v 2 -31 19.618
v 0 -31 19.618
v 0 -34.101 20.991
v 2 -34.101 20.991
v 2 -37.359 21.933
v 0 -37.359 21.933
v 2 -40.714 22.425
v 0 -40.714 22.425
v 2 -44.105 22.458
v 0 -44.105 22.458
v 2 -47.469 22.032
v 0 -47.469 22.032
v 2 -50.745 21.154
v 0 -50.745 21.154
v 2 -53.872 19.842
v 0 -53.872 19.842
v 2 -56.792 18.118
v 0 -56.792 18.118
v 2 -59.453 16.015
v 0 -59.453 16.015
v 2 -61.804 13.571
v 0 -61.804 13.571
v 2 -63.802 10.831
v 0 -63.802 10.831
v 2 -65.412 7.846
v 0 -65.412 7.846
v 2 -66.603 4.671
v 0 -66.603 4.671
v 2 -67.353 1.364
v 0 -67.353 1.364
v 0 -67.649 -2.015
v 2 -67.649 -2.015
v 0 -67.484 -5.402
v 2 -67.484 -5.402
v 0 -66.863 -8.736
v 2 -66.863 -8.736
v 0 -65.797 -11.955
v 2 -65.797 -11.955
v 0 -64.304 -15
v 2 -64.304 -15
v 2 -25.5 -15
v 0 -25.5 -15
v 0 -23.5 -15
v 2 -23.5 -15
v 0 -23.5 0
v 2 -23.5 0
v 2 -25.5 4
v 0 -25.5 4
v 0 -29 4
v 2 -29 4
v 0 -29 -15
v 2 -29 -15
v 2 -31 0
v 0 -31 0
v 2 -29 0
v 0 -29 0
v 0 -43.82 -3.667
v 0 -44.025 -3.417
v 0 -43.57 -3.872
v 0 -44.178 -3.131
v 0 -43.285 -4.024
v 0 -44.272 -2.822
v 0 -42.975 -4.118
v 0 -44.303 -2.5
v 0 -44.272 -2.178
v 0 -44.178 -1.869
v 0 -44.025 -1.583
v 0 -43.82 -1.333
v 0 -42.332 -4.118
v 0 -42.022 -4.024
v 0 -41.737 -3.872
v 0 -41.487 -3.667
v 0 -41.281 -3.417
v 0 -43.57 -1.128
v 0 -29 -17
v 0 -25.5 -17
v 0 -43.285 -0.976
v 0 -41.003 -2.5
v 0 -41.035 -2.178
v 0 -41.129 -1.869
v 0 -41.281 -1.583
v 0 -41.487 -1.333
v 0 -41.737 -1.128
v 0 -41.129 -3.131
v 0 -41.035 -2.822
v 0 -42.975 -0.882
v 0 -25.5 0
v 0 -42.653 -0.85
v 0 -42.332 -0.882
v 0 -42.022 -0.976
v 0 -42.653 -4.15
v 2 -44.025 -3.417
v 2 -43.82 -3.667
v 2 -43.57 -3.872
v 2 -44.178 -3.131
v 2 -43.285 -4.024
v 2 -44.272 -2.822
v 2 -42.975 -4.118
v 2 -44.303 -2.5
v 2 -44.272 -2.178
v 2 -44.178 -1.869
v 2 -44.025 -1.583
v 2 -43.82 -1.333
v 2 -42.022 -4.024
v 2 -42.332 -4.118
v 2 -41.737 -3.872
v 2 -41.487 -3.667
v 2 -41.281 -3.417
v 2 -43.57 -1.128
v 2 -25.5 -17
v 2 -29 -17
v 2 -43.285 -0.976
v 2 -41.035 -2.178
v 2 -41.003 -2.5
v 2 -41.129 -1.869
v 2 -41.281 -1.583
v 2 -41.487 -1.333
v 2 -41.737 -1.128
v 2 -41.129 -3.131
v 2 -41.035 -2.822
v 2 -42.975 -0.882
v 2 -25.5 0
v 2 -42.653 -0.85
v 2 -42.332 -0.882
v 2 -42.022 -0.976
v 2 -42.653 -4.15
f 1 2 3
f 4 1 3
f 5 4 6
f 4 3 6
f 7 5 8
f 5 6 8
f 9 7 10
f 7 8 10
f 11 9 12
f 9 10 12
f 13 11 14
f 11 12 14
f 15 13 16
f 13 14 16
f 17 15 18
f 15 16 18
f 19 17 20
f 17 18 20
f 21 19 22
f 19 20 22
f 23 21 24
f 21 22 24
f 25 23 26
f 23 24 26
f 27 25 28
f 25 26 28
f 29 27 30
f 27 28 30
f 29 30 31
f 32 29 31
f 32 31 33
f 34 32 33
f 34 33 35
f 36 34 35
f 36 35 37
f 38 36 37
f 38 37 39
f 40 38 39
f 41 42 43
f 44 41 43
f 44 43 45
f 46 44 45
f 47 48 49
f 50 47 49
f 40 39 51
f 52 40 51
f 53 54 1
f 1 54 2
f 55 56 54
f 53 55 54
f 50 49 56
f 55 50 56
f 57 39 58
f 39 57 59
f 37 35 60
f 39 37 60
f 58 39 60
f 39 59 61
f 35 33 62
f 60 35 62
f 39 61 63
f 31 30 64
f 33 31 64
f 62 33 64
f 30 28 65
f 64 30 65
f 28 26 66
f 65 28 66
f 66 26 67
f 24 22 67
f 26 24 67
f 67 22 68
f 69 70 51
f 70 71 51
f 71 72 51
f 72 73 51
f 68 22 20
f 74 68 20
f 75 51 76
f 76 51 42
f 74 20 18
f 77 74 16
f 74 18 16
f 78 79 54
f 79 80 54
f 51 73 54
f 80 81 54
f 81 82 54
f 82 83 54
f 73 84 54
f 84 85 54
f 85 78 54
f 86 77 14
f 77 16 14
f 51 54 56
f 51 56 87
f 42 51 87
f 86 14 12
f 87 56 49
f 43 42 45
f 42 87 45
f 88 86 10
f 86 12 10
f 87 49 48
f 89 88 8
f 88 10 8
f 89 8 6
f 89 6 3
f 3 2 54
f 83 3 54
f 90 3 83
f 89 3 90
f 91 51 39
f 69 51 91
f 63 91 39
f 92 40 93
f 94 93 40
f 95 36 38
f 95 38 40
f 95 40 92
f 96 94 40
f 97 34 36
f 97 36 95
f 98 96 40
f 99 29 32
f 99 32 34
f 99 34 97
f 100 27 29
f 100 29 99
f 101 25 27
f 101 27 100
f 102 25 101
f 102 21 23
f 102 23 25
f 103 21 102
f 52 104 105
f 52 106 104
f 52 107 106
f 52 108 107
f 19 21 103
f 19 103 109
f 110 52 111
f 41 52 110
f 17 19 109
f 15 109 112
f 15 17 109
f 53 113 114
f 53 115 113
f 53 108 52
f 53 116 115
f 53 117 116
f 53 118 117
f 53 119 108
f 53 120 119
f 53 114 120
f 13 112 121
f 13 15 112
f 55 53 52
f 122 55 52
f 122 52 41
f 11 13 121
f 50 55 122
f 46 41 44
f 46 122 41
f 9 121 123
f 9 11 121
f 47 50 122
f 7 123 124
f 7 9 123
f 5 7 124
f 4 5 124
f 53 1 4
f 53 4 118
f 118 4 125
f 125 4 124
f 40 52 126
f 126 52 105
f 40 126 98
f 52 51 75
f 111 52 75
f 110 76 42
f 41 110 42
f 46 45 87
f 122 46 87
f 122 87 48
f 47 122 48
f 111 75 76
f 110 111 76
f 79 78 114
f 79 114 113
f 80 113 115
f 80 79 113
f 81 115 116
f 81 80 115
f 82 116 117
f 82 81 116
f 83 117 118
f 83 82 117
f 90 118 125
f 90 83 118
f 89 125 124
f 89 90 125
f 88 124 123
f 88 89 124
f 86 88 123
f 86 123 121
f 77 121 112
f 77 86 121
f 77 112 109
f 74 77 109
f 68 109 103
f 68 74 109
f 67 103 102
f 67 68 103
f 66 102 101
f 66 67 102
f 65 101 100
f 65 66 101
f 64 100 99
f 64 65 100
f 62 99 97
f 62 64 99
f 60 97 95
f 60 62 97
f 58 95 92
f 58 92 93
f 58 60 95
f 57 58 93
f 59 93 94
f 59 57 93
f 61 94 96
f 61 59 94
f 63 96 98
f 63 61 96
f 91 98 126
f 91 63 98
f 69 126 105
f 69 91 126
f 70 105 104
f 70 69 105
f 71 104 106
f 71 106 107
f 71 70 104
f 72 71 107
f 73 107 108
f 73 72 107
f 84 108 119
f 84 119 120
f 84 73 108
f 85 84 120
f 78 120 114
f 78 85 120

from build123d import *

# Parameters (mm, degrees)
F0_R     = 1.65
F1_DEPTH = 2


with BuildPart() as f1:
    # F0 (on Right) → F1 (new body)
    with BuildSketch(Plane.YZ):
        with BuildLine():
            Line((-29, 0), (-31, 0))
            Line((-31, 0), (-31, 4))
            Line((-31, 4), (-31, 19.617821))
            ThreePointArc((-31, 19.617821), (-60.66964, 14.832498), (-64.304047, -15))
            Line((-64.304047, -15), (-42.653412, -15))
            Line((-42.653412, -15), (-29, -15))
            Line((-29, -15), (-29, -17))
            Line((-29, -17), (-25.5, -17))
            Line((-25.5, -17), (-25.5, -15))
            Line((-25.5, -15), (-23.5, -15))
            Line((-23.5, -15), (-23.5, 0))
            Line((-23.5, 0), (-25.5, 0))
            Line((-25.5, 0), (-25.5, 4))
            Line((-25.5, 4), (-29, 4))
            Line((-29, 4), (-29, 0))
        make_face()
        with Locations((-42.653412, -2.5)):
            Circle(F0_R, mode=Mode.SUBTRACT)
    extrude(amount=F1_DEPTH)


solid = f1.part
